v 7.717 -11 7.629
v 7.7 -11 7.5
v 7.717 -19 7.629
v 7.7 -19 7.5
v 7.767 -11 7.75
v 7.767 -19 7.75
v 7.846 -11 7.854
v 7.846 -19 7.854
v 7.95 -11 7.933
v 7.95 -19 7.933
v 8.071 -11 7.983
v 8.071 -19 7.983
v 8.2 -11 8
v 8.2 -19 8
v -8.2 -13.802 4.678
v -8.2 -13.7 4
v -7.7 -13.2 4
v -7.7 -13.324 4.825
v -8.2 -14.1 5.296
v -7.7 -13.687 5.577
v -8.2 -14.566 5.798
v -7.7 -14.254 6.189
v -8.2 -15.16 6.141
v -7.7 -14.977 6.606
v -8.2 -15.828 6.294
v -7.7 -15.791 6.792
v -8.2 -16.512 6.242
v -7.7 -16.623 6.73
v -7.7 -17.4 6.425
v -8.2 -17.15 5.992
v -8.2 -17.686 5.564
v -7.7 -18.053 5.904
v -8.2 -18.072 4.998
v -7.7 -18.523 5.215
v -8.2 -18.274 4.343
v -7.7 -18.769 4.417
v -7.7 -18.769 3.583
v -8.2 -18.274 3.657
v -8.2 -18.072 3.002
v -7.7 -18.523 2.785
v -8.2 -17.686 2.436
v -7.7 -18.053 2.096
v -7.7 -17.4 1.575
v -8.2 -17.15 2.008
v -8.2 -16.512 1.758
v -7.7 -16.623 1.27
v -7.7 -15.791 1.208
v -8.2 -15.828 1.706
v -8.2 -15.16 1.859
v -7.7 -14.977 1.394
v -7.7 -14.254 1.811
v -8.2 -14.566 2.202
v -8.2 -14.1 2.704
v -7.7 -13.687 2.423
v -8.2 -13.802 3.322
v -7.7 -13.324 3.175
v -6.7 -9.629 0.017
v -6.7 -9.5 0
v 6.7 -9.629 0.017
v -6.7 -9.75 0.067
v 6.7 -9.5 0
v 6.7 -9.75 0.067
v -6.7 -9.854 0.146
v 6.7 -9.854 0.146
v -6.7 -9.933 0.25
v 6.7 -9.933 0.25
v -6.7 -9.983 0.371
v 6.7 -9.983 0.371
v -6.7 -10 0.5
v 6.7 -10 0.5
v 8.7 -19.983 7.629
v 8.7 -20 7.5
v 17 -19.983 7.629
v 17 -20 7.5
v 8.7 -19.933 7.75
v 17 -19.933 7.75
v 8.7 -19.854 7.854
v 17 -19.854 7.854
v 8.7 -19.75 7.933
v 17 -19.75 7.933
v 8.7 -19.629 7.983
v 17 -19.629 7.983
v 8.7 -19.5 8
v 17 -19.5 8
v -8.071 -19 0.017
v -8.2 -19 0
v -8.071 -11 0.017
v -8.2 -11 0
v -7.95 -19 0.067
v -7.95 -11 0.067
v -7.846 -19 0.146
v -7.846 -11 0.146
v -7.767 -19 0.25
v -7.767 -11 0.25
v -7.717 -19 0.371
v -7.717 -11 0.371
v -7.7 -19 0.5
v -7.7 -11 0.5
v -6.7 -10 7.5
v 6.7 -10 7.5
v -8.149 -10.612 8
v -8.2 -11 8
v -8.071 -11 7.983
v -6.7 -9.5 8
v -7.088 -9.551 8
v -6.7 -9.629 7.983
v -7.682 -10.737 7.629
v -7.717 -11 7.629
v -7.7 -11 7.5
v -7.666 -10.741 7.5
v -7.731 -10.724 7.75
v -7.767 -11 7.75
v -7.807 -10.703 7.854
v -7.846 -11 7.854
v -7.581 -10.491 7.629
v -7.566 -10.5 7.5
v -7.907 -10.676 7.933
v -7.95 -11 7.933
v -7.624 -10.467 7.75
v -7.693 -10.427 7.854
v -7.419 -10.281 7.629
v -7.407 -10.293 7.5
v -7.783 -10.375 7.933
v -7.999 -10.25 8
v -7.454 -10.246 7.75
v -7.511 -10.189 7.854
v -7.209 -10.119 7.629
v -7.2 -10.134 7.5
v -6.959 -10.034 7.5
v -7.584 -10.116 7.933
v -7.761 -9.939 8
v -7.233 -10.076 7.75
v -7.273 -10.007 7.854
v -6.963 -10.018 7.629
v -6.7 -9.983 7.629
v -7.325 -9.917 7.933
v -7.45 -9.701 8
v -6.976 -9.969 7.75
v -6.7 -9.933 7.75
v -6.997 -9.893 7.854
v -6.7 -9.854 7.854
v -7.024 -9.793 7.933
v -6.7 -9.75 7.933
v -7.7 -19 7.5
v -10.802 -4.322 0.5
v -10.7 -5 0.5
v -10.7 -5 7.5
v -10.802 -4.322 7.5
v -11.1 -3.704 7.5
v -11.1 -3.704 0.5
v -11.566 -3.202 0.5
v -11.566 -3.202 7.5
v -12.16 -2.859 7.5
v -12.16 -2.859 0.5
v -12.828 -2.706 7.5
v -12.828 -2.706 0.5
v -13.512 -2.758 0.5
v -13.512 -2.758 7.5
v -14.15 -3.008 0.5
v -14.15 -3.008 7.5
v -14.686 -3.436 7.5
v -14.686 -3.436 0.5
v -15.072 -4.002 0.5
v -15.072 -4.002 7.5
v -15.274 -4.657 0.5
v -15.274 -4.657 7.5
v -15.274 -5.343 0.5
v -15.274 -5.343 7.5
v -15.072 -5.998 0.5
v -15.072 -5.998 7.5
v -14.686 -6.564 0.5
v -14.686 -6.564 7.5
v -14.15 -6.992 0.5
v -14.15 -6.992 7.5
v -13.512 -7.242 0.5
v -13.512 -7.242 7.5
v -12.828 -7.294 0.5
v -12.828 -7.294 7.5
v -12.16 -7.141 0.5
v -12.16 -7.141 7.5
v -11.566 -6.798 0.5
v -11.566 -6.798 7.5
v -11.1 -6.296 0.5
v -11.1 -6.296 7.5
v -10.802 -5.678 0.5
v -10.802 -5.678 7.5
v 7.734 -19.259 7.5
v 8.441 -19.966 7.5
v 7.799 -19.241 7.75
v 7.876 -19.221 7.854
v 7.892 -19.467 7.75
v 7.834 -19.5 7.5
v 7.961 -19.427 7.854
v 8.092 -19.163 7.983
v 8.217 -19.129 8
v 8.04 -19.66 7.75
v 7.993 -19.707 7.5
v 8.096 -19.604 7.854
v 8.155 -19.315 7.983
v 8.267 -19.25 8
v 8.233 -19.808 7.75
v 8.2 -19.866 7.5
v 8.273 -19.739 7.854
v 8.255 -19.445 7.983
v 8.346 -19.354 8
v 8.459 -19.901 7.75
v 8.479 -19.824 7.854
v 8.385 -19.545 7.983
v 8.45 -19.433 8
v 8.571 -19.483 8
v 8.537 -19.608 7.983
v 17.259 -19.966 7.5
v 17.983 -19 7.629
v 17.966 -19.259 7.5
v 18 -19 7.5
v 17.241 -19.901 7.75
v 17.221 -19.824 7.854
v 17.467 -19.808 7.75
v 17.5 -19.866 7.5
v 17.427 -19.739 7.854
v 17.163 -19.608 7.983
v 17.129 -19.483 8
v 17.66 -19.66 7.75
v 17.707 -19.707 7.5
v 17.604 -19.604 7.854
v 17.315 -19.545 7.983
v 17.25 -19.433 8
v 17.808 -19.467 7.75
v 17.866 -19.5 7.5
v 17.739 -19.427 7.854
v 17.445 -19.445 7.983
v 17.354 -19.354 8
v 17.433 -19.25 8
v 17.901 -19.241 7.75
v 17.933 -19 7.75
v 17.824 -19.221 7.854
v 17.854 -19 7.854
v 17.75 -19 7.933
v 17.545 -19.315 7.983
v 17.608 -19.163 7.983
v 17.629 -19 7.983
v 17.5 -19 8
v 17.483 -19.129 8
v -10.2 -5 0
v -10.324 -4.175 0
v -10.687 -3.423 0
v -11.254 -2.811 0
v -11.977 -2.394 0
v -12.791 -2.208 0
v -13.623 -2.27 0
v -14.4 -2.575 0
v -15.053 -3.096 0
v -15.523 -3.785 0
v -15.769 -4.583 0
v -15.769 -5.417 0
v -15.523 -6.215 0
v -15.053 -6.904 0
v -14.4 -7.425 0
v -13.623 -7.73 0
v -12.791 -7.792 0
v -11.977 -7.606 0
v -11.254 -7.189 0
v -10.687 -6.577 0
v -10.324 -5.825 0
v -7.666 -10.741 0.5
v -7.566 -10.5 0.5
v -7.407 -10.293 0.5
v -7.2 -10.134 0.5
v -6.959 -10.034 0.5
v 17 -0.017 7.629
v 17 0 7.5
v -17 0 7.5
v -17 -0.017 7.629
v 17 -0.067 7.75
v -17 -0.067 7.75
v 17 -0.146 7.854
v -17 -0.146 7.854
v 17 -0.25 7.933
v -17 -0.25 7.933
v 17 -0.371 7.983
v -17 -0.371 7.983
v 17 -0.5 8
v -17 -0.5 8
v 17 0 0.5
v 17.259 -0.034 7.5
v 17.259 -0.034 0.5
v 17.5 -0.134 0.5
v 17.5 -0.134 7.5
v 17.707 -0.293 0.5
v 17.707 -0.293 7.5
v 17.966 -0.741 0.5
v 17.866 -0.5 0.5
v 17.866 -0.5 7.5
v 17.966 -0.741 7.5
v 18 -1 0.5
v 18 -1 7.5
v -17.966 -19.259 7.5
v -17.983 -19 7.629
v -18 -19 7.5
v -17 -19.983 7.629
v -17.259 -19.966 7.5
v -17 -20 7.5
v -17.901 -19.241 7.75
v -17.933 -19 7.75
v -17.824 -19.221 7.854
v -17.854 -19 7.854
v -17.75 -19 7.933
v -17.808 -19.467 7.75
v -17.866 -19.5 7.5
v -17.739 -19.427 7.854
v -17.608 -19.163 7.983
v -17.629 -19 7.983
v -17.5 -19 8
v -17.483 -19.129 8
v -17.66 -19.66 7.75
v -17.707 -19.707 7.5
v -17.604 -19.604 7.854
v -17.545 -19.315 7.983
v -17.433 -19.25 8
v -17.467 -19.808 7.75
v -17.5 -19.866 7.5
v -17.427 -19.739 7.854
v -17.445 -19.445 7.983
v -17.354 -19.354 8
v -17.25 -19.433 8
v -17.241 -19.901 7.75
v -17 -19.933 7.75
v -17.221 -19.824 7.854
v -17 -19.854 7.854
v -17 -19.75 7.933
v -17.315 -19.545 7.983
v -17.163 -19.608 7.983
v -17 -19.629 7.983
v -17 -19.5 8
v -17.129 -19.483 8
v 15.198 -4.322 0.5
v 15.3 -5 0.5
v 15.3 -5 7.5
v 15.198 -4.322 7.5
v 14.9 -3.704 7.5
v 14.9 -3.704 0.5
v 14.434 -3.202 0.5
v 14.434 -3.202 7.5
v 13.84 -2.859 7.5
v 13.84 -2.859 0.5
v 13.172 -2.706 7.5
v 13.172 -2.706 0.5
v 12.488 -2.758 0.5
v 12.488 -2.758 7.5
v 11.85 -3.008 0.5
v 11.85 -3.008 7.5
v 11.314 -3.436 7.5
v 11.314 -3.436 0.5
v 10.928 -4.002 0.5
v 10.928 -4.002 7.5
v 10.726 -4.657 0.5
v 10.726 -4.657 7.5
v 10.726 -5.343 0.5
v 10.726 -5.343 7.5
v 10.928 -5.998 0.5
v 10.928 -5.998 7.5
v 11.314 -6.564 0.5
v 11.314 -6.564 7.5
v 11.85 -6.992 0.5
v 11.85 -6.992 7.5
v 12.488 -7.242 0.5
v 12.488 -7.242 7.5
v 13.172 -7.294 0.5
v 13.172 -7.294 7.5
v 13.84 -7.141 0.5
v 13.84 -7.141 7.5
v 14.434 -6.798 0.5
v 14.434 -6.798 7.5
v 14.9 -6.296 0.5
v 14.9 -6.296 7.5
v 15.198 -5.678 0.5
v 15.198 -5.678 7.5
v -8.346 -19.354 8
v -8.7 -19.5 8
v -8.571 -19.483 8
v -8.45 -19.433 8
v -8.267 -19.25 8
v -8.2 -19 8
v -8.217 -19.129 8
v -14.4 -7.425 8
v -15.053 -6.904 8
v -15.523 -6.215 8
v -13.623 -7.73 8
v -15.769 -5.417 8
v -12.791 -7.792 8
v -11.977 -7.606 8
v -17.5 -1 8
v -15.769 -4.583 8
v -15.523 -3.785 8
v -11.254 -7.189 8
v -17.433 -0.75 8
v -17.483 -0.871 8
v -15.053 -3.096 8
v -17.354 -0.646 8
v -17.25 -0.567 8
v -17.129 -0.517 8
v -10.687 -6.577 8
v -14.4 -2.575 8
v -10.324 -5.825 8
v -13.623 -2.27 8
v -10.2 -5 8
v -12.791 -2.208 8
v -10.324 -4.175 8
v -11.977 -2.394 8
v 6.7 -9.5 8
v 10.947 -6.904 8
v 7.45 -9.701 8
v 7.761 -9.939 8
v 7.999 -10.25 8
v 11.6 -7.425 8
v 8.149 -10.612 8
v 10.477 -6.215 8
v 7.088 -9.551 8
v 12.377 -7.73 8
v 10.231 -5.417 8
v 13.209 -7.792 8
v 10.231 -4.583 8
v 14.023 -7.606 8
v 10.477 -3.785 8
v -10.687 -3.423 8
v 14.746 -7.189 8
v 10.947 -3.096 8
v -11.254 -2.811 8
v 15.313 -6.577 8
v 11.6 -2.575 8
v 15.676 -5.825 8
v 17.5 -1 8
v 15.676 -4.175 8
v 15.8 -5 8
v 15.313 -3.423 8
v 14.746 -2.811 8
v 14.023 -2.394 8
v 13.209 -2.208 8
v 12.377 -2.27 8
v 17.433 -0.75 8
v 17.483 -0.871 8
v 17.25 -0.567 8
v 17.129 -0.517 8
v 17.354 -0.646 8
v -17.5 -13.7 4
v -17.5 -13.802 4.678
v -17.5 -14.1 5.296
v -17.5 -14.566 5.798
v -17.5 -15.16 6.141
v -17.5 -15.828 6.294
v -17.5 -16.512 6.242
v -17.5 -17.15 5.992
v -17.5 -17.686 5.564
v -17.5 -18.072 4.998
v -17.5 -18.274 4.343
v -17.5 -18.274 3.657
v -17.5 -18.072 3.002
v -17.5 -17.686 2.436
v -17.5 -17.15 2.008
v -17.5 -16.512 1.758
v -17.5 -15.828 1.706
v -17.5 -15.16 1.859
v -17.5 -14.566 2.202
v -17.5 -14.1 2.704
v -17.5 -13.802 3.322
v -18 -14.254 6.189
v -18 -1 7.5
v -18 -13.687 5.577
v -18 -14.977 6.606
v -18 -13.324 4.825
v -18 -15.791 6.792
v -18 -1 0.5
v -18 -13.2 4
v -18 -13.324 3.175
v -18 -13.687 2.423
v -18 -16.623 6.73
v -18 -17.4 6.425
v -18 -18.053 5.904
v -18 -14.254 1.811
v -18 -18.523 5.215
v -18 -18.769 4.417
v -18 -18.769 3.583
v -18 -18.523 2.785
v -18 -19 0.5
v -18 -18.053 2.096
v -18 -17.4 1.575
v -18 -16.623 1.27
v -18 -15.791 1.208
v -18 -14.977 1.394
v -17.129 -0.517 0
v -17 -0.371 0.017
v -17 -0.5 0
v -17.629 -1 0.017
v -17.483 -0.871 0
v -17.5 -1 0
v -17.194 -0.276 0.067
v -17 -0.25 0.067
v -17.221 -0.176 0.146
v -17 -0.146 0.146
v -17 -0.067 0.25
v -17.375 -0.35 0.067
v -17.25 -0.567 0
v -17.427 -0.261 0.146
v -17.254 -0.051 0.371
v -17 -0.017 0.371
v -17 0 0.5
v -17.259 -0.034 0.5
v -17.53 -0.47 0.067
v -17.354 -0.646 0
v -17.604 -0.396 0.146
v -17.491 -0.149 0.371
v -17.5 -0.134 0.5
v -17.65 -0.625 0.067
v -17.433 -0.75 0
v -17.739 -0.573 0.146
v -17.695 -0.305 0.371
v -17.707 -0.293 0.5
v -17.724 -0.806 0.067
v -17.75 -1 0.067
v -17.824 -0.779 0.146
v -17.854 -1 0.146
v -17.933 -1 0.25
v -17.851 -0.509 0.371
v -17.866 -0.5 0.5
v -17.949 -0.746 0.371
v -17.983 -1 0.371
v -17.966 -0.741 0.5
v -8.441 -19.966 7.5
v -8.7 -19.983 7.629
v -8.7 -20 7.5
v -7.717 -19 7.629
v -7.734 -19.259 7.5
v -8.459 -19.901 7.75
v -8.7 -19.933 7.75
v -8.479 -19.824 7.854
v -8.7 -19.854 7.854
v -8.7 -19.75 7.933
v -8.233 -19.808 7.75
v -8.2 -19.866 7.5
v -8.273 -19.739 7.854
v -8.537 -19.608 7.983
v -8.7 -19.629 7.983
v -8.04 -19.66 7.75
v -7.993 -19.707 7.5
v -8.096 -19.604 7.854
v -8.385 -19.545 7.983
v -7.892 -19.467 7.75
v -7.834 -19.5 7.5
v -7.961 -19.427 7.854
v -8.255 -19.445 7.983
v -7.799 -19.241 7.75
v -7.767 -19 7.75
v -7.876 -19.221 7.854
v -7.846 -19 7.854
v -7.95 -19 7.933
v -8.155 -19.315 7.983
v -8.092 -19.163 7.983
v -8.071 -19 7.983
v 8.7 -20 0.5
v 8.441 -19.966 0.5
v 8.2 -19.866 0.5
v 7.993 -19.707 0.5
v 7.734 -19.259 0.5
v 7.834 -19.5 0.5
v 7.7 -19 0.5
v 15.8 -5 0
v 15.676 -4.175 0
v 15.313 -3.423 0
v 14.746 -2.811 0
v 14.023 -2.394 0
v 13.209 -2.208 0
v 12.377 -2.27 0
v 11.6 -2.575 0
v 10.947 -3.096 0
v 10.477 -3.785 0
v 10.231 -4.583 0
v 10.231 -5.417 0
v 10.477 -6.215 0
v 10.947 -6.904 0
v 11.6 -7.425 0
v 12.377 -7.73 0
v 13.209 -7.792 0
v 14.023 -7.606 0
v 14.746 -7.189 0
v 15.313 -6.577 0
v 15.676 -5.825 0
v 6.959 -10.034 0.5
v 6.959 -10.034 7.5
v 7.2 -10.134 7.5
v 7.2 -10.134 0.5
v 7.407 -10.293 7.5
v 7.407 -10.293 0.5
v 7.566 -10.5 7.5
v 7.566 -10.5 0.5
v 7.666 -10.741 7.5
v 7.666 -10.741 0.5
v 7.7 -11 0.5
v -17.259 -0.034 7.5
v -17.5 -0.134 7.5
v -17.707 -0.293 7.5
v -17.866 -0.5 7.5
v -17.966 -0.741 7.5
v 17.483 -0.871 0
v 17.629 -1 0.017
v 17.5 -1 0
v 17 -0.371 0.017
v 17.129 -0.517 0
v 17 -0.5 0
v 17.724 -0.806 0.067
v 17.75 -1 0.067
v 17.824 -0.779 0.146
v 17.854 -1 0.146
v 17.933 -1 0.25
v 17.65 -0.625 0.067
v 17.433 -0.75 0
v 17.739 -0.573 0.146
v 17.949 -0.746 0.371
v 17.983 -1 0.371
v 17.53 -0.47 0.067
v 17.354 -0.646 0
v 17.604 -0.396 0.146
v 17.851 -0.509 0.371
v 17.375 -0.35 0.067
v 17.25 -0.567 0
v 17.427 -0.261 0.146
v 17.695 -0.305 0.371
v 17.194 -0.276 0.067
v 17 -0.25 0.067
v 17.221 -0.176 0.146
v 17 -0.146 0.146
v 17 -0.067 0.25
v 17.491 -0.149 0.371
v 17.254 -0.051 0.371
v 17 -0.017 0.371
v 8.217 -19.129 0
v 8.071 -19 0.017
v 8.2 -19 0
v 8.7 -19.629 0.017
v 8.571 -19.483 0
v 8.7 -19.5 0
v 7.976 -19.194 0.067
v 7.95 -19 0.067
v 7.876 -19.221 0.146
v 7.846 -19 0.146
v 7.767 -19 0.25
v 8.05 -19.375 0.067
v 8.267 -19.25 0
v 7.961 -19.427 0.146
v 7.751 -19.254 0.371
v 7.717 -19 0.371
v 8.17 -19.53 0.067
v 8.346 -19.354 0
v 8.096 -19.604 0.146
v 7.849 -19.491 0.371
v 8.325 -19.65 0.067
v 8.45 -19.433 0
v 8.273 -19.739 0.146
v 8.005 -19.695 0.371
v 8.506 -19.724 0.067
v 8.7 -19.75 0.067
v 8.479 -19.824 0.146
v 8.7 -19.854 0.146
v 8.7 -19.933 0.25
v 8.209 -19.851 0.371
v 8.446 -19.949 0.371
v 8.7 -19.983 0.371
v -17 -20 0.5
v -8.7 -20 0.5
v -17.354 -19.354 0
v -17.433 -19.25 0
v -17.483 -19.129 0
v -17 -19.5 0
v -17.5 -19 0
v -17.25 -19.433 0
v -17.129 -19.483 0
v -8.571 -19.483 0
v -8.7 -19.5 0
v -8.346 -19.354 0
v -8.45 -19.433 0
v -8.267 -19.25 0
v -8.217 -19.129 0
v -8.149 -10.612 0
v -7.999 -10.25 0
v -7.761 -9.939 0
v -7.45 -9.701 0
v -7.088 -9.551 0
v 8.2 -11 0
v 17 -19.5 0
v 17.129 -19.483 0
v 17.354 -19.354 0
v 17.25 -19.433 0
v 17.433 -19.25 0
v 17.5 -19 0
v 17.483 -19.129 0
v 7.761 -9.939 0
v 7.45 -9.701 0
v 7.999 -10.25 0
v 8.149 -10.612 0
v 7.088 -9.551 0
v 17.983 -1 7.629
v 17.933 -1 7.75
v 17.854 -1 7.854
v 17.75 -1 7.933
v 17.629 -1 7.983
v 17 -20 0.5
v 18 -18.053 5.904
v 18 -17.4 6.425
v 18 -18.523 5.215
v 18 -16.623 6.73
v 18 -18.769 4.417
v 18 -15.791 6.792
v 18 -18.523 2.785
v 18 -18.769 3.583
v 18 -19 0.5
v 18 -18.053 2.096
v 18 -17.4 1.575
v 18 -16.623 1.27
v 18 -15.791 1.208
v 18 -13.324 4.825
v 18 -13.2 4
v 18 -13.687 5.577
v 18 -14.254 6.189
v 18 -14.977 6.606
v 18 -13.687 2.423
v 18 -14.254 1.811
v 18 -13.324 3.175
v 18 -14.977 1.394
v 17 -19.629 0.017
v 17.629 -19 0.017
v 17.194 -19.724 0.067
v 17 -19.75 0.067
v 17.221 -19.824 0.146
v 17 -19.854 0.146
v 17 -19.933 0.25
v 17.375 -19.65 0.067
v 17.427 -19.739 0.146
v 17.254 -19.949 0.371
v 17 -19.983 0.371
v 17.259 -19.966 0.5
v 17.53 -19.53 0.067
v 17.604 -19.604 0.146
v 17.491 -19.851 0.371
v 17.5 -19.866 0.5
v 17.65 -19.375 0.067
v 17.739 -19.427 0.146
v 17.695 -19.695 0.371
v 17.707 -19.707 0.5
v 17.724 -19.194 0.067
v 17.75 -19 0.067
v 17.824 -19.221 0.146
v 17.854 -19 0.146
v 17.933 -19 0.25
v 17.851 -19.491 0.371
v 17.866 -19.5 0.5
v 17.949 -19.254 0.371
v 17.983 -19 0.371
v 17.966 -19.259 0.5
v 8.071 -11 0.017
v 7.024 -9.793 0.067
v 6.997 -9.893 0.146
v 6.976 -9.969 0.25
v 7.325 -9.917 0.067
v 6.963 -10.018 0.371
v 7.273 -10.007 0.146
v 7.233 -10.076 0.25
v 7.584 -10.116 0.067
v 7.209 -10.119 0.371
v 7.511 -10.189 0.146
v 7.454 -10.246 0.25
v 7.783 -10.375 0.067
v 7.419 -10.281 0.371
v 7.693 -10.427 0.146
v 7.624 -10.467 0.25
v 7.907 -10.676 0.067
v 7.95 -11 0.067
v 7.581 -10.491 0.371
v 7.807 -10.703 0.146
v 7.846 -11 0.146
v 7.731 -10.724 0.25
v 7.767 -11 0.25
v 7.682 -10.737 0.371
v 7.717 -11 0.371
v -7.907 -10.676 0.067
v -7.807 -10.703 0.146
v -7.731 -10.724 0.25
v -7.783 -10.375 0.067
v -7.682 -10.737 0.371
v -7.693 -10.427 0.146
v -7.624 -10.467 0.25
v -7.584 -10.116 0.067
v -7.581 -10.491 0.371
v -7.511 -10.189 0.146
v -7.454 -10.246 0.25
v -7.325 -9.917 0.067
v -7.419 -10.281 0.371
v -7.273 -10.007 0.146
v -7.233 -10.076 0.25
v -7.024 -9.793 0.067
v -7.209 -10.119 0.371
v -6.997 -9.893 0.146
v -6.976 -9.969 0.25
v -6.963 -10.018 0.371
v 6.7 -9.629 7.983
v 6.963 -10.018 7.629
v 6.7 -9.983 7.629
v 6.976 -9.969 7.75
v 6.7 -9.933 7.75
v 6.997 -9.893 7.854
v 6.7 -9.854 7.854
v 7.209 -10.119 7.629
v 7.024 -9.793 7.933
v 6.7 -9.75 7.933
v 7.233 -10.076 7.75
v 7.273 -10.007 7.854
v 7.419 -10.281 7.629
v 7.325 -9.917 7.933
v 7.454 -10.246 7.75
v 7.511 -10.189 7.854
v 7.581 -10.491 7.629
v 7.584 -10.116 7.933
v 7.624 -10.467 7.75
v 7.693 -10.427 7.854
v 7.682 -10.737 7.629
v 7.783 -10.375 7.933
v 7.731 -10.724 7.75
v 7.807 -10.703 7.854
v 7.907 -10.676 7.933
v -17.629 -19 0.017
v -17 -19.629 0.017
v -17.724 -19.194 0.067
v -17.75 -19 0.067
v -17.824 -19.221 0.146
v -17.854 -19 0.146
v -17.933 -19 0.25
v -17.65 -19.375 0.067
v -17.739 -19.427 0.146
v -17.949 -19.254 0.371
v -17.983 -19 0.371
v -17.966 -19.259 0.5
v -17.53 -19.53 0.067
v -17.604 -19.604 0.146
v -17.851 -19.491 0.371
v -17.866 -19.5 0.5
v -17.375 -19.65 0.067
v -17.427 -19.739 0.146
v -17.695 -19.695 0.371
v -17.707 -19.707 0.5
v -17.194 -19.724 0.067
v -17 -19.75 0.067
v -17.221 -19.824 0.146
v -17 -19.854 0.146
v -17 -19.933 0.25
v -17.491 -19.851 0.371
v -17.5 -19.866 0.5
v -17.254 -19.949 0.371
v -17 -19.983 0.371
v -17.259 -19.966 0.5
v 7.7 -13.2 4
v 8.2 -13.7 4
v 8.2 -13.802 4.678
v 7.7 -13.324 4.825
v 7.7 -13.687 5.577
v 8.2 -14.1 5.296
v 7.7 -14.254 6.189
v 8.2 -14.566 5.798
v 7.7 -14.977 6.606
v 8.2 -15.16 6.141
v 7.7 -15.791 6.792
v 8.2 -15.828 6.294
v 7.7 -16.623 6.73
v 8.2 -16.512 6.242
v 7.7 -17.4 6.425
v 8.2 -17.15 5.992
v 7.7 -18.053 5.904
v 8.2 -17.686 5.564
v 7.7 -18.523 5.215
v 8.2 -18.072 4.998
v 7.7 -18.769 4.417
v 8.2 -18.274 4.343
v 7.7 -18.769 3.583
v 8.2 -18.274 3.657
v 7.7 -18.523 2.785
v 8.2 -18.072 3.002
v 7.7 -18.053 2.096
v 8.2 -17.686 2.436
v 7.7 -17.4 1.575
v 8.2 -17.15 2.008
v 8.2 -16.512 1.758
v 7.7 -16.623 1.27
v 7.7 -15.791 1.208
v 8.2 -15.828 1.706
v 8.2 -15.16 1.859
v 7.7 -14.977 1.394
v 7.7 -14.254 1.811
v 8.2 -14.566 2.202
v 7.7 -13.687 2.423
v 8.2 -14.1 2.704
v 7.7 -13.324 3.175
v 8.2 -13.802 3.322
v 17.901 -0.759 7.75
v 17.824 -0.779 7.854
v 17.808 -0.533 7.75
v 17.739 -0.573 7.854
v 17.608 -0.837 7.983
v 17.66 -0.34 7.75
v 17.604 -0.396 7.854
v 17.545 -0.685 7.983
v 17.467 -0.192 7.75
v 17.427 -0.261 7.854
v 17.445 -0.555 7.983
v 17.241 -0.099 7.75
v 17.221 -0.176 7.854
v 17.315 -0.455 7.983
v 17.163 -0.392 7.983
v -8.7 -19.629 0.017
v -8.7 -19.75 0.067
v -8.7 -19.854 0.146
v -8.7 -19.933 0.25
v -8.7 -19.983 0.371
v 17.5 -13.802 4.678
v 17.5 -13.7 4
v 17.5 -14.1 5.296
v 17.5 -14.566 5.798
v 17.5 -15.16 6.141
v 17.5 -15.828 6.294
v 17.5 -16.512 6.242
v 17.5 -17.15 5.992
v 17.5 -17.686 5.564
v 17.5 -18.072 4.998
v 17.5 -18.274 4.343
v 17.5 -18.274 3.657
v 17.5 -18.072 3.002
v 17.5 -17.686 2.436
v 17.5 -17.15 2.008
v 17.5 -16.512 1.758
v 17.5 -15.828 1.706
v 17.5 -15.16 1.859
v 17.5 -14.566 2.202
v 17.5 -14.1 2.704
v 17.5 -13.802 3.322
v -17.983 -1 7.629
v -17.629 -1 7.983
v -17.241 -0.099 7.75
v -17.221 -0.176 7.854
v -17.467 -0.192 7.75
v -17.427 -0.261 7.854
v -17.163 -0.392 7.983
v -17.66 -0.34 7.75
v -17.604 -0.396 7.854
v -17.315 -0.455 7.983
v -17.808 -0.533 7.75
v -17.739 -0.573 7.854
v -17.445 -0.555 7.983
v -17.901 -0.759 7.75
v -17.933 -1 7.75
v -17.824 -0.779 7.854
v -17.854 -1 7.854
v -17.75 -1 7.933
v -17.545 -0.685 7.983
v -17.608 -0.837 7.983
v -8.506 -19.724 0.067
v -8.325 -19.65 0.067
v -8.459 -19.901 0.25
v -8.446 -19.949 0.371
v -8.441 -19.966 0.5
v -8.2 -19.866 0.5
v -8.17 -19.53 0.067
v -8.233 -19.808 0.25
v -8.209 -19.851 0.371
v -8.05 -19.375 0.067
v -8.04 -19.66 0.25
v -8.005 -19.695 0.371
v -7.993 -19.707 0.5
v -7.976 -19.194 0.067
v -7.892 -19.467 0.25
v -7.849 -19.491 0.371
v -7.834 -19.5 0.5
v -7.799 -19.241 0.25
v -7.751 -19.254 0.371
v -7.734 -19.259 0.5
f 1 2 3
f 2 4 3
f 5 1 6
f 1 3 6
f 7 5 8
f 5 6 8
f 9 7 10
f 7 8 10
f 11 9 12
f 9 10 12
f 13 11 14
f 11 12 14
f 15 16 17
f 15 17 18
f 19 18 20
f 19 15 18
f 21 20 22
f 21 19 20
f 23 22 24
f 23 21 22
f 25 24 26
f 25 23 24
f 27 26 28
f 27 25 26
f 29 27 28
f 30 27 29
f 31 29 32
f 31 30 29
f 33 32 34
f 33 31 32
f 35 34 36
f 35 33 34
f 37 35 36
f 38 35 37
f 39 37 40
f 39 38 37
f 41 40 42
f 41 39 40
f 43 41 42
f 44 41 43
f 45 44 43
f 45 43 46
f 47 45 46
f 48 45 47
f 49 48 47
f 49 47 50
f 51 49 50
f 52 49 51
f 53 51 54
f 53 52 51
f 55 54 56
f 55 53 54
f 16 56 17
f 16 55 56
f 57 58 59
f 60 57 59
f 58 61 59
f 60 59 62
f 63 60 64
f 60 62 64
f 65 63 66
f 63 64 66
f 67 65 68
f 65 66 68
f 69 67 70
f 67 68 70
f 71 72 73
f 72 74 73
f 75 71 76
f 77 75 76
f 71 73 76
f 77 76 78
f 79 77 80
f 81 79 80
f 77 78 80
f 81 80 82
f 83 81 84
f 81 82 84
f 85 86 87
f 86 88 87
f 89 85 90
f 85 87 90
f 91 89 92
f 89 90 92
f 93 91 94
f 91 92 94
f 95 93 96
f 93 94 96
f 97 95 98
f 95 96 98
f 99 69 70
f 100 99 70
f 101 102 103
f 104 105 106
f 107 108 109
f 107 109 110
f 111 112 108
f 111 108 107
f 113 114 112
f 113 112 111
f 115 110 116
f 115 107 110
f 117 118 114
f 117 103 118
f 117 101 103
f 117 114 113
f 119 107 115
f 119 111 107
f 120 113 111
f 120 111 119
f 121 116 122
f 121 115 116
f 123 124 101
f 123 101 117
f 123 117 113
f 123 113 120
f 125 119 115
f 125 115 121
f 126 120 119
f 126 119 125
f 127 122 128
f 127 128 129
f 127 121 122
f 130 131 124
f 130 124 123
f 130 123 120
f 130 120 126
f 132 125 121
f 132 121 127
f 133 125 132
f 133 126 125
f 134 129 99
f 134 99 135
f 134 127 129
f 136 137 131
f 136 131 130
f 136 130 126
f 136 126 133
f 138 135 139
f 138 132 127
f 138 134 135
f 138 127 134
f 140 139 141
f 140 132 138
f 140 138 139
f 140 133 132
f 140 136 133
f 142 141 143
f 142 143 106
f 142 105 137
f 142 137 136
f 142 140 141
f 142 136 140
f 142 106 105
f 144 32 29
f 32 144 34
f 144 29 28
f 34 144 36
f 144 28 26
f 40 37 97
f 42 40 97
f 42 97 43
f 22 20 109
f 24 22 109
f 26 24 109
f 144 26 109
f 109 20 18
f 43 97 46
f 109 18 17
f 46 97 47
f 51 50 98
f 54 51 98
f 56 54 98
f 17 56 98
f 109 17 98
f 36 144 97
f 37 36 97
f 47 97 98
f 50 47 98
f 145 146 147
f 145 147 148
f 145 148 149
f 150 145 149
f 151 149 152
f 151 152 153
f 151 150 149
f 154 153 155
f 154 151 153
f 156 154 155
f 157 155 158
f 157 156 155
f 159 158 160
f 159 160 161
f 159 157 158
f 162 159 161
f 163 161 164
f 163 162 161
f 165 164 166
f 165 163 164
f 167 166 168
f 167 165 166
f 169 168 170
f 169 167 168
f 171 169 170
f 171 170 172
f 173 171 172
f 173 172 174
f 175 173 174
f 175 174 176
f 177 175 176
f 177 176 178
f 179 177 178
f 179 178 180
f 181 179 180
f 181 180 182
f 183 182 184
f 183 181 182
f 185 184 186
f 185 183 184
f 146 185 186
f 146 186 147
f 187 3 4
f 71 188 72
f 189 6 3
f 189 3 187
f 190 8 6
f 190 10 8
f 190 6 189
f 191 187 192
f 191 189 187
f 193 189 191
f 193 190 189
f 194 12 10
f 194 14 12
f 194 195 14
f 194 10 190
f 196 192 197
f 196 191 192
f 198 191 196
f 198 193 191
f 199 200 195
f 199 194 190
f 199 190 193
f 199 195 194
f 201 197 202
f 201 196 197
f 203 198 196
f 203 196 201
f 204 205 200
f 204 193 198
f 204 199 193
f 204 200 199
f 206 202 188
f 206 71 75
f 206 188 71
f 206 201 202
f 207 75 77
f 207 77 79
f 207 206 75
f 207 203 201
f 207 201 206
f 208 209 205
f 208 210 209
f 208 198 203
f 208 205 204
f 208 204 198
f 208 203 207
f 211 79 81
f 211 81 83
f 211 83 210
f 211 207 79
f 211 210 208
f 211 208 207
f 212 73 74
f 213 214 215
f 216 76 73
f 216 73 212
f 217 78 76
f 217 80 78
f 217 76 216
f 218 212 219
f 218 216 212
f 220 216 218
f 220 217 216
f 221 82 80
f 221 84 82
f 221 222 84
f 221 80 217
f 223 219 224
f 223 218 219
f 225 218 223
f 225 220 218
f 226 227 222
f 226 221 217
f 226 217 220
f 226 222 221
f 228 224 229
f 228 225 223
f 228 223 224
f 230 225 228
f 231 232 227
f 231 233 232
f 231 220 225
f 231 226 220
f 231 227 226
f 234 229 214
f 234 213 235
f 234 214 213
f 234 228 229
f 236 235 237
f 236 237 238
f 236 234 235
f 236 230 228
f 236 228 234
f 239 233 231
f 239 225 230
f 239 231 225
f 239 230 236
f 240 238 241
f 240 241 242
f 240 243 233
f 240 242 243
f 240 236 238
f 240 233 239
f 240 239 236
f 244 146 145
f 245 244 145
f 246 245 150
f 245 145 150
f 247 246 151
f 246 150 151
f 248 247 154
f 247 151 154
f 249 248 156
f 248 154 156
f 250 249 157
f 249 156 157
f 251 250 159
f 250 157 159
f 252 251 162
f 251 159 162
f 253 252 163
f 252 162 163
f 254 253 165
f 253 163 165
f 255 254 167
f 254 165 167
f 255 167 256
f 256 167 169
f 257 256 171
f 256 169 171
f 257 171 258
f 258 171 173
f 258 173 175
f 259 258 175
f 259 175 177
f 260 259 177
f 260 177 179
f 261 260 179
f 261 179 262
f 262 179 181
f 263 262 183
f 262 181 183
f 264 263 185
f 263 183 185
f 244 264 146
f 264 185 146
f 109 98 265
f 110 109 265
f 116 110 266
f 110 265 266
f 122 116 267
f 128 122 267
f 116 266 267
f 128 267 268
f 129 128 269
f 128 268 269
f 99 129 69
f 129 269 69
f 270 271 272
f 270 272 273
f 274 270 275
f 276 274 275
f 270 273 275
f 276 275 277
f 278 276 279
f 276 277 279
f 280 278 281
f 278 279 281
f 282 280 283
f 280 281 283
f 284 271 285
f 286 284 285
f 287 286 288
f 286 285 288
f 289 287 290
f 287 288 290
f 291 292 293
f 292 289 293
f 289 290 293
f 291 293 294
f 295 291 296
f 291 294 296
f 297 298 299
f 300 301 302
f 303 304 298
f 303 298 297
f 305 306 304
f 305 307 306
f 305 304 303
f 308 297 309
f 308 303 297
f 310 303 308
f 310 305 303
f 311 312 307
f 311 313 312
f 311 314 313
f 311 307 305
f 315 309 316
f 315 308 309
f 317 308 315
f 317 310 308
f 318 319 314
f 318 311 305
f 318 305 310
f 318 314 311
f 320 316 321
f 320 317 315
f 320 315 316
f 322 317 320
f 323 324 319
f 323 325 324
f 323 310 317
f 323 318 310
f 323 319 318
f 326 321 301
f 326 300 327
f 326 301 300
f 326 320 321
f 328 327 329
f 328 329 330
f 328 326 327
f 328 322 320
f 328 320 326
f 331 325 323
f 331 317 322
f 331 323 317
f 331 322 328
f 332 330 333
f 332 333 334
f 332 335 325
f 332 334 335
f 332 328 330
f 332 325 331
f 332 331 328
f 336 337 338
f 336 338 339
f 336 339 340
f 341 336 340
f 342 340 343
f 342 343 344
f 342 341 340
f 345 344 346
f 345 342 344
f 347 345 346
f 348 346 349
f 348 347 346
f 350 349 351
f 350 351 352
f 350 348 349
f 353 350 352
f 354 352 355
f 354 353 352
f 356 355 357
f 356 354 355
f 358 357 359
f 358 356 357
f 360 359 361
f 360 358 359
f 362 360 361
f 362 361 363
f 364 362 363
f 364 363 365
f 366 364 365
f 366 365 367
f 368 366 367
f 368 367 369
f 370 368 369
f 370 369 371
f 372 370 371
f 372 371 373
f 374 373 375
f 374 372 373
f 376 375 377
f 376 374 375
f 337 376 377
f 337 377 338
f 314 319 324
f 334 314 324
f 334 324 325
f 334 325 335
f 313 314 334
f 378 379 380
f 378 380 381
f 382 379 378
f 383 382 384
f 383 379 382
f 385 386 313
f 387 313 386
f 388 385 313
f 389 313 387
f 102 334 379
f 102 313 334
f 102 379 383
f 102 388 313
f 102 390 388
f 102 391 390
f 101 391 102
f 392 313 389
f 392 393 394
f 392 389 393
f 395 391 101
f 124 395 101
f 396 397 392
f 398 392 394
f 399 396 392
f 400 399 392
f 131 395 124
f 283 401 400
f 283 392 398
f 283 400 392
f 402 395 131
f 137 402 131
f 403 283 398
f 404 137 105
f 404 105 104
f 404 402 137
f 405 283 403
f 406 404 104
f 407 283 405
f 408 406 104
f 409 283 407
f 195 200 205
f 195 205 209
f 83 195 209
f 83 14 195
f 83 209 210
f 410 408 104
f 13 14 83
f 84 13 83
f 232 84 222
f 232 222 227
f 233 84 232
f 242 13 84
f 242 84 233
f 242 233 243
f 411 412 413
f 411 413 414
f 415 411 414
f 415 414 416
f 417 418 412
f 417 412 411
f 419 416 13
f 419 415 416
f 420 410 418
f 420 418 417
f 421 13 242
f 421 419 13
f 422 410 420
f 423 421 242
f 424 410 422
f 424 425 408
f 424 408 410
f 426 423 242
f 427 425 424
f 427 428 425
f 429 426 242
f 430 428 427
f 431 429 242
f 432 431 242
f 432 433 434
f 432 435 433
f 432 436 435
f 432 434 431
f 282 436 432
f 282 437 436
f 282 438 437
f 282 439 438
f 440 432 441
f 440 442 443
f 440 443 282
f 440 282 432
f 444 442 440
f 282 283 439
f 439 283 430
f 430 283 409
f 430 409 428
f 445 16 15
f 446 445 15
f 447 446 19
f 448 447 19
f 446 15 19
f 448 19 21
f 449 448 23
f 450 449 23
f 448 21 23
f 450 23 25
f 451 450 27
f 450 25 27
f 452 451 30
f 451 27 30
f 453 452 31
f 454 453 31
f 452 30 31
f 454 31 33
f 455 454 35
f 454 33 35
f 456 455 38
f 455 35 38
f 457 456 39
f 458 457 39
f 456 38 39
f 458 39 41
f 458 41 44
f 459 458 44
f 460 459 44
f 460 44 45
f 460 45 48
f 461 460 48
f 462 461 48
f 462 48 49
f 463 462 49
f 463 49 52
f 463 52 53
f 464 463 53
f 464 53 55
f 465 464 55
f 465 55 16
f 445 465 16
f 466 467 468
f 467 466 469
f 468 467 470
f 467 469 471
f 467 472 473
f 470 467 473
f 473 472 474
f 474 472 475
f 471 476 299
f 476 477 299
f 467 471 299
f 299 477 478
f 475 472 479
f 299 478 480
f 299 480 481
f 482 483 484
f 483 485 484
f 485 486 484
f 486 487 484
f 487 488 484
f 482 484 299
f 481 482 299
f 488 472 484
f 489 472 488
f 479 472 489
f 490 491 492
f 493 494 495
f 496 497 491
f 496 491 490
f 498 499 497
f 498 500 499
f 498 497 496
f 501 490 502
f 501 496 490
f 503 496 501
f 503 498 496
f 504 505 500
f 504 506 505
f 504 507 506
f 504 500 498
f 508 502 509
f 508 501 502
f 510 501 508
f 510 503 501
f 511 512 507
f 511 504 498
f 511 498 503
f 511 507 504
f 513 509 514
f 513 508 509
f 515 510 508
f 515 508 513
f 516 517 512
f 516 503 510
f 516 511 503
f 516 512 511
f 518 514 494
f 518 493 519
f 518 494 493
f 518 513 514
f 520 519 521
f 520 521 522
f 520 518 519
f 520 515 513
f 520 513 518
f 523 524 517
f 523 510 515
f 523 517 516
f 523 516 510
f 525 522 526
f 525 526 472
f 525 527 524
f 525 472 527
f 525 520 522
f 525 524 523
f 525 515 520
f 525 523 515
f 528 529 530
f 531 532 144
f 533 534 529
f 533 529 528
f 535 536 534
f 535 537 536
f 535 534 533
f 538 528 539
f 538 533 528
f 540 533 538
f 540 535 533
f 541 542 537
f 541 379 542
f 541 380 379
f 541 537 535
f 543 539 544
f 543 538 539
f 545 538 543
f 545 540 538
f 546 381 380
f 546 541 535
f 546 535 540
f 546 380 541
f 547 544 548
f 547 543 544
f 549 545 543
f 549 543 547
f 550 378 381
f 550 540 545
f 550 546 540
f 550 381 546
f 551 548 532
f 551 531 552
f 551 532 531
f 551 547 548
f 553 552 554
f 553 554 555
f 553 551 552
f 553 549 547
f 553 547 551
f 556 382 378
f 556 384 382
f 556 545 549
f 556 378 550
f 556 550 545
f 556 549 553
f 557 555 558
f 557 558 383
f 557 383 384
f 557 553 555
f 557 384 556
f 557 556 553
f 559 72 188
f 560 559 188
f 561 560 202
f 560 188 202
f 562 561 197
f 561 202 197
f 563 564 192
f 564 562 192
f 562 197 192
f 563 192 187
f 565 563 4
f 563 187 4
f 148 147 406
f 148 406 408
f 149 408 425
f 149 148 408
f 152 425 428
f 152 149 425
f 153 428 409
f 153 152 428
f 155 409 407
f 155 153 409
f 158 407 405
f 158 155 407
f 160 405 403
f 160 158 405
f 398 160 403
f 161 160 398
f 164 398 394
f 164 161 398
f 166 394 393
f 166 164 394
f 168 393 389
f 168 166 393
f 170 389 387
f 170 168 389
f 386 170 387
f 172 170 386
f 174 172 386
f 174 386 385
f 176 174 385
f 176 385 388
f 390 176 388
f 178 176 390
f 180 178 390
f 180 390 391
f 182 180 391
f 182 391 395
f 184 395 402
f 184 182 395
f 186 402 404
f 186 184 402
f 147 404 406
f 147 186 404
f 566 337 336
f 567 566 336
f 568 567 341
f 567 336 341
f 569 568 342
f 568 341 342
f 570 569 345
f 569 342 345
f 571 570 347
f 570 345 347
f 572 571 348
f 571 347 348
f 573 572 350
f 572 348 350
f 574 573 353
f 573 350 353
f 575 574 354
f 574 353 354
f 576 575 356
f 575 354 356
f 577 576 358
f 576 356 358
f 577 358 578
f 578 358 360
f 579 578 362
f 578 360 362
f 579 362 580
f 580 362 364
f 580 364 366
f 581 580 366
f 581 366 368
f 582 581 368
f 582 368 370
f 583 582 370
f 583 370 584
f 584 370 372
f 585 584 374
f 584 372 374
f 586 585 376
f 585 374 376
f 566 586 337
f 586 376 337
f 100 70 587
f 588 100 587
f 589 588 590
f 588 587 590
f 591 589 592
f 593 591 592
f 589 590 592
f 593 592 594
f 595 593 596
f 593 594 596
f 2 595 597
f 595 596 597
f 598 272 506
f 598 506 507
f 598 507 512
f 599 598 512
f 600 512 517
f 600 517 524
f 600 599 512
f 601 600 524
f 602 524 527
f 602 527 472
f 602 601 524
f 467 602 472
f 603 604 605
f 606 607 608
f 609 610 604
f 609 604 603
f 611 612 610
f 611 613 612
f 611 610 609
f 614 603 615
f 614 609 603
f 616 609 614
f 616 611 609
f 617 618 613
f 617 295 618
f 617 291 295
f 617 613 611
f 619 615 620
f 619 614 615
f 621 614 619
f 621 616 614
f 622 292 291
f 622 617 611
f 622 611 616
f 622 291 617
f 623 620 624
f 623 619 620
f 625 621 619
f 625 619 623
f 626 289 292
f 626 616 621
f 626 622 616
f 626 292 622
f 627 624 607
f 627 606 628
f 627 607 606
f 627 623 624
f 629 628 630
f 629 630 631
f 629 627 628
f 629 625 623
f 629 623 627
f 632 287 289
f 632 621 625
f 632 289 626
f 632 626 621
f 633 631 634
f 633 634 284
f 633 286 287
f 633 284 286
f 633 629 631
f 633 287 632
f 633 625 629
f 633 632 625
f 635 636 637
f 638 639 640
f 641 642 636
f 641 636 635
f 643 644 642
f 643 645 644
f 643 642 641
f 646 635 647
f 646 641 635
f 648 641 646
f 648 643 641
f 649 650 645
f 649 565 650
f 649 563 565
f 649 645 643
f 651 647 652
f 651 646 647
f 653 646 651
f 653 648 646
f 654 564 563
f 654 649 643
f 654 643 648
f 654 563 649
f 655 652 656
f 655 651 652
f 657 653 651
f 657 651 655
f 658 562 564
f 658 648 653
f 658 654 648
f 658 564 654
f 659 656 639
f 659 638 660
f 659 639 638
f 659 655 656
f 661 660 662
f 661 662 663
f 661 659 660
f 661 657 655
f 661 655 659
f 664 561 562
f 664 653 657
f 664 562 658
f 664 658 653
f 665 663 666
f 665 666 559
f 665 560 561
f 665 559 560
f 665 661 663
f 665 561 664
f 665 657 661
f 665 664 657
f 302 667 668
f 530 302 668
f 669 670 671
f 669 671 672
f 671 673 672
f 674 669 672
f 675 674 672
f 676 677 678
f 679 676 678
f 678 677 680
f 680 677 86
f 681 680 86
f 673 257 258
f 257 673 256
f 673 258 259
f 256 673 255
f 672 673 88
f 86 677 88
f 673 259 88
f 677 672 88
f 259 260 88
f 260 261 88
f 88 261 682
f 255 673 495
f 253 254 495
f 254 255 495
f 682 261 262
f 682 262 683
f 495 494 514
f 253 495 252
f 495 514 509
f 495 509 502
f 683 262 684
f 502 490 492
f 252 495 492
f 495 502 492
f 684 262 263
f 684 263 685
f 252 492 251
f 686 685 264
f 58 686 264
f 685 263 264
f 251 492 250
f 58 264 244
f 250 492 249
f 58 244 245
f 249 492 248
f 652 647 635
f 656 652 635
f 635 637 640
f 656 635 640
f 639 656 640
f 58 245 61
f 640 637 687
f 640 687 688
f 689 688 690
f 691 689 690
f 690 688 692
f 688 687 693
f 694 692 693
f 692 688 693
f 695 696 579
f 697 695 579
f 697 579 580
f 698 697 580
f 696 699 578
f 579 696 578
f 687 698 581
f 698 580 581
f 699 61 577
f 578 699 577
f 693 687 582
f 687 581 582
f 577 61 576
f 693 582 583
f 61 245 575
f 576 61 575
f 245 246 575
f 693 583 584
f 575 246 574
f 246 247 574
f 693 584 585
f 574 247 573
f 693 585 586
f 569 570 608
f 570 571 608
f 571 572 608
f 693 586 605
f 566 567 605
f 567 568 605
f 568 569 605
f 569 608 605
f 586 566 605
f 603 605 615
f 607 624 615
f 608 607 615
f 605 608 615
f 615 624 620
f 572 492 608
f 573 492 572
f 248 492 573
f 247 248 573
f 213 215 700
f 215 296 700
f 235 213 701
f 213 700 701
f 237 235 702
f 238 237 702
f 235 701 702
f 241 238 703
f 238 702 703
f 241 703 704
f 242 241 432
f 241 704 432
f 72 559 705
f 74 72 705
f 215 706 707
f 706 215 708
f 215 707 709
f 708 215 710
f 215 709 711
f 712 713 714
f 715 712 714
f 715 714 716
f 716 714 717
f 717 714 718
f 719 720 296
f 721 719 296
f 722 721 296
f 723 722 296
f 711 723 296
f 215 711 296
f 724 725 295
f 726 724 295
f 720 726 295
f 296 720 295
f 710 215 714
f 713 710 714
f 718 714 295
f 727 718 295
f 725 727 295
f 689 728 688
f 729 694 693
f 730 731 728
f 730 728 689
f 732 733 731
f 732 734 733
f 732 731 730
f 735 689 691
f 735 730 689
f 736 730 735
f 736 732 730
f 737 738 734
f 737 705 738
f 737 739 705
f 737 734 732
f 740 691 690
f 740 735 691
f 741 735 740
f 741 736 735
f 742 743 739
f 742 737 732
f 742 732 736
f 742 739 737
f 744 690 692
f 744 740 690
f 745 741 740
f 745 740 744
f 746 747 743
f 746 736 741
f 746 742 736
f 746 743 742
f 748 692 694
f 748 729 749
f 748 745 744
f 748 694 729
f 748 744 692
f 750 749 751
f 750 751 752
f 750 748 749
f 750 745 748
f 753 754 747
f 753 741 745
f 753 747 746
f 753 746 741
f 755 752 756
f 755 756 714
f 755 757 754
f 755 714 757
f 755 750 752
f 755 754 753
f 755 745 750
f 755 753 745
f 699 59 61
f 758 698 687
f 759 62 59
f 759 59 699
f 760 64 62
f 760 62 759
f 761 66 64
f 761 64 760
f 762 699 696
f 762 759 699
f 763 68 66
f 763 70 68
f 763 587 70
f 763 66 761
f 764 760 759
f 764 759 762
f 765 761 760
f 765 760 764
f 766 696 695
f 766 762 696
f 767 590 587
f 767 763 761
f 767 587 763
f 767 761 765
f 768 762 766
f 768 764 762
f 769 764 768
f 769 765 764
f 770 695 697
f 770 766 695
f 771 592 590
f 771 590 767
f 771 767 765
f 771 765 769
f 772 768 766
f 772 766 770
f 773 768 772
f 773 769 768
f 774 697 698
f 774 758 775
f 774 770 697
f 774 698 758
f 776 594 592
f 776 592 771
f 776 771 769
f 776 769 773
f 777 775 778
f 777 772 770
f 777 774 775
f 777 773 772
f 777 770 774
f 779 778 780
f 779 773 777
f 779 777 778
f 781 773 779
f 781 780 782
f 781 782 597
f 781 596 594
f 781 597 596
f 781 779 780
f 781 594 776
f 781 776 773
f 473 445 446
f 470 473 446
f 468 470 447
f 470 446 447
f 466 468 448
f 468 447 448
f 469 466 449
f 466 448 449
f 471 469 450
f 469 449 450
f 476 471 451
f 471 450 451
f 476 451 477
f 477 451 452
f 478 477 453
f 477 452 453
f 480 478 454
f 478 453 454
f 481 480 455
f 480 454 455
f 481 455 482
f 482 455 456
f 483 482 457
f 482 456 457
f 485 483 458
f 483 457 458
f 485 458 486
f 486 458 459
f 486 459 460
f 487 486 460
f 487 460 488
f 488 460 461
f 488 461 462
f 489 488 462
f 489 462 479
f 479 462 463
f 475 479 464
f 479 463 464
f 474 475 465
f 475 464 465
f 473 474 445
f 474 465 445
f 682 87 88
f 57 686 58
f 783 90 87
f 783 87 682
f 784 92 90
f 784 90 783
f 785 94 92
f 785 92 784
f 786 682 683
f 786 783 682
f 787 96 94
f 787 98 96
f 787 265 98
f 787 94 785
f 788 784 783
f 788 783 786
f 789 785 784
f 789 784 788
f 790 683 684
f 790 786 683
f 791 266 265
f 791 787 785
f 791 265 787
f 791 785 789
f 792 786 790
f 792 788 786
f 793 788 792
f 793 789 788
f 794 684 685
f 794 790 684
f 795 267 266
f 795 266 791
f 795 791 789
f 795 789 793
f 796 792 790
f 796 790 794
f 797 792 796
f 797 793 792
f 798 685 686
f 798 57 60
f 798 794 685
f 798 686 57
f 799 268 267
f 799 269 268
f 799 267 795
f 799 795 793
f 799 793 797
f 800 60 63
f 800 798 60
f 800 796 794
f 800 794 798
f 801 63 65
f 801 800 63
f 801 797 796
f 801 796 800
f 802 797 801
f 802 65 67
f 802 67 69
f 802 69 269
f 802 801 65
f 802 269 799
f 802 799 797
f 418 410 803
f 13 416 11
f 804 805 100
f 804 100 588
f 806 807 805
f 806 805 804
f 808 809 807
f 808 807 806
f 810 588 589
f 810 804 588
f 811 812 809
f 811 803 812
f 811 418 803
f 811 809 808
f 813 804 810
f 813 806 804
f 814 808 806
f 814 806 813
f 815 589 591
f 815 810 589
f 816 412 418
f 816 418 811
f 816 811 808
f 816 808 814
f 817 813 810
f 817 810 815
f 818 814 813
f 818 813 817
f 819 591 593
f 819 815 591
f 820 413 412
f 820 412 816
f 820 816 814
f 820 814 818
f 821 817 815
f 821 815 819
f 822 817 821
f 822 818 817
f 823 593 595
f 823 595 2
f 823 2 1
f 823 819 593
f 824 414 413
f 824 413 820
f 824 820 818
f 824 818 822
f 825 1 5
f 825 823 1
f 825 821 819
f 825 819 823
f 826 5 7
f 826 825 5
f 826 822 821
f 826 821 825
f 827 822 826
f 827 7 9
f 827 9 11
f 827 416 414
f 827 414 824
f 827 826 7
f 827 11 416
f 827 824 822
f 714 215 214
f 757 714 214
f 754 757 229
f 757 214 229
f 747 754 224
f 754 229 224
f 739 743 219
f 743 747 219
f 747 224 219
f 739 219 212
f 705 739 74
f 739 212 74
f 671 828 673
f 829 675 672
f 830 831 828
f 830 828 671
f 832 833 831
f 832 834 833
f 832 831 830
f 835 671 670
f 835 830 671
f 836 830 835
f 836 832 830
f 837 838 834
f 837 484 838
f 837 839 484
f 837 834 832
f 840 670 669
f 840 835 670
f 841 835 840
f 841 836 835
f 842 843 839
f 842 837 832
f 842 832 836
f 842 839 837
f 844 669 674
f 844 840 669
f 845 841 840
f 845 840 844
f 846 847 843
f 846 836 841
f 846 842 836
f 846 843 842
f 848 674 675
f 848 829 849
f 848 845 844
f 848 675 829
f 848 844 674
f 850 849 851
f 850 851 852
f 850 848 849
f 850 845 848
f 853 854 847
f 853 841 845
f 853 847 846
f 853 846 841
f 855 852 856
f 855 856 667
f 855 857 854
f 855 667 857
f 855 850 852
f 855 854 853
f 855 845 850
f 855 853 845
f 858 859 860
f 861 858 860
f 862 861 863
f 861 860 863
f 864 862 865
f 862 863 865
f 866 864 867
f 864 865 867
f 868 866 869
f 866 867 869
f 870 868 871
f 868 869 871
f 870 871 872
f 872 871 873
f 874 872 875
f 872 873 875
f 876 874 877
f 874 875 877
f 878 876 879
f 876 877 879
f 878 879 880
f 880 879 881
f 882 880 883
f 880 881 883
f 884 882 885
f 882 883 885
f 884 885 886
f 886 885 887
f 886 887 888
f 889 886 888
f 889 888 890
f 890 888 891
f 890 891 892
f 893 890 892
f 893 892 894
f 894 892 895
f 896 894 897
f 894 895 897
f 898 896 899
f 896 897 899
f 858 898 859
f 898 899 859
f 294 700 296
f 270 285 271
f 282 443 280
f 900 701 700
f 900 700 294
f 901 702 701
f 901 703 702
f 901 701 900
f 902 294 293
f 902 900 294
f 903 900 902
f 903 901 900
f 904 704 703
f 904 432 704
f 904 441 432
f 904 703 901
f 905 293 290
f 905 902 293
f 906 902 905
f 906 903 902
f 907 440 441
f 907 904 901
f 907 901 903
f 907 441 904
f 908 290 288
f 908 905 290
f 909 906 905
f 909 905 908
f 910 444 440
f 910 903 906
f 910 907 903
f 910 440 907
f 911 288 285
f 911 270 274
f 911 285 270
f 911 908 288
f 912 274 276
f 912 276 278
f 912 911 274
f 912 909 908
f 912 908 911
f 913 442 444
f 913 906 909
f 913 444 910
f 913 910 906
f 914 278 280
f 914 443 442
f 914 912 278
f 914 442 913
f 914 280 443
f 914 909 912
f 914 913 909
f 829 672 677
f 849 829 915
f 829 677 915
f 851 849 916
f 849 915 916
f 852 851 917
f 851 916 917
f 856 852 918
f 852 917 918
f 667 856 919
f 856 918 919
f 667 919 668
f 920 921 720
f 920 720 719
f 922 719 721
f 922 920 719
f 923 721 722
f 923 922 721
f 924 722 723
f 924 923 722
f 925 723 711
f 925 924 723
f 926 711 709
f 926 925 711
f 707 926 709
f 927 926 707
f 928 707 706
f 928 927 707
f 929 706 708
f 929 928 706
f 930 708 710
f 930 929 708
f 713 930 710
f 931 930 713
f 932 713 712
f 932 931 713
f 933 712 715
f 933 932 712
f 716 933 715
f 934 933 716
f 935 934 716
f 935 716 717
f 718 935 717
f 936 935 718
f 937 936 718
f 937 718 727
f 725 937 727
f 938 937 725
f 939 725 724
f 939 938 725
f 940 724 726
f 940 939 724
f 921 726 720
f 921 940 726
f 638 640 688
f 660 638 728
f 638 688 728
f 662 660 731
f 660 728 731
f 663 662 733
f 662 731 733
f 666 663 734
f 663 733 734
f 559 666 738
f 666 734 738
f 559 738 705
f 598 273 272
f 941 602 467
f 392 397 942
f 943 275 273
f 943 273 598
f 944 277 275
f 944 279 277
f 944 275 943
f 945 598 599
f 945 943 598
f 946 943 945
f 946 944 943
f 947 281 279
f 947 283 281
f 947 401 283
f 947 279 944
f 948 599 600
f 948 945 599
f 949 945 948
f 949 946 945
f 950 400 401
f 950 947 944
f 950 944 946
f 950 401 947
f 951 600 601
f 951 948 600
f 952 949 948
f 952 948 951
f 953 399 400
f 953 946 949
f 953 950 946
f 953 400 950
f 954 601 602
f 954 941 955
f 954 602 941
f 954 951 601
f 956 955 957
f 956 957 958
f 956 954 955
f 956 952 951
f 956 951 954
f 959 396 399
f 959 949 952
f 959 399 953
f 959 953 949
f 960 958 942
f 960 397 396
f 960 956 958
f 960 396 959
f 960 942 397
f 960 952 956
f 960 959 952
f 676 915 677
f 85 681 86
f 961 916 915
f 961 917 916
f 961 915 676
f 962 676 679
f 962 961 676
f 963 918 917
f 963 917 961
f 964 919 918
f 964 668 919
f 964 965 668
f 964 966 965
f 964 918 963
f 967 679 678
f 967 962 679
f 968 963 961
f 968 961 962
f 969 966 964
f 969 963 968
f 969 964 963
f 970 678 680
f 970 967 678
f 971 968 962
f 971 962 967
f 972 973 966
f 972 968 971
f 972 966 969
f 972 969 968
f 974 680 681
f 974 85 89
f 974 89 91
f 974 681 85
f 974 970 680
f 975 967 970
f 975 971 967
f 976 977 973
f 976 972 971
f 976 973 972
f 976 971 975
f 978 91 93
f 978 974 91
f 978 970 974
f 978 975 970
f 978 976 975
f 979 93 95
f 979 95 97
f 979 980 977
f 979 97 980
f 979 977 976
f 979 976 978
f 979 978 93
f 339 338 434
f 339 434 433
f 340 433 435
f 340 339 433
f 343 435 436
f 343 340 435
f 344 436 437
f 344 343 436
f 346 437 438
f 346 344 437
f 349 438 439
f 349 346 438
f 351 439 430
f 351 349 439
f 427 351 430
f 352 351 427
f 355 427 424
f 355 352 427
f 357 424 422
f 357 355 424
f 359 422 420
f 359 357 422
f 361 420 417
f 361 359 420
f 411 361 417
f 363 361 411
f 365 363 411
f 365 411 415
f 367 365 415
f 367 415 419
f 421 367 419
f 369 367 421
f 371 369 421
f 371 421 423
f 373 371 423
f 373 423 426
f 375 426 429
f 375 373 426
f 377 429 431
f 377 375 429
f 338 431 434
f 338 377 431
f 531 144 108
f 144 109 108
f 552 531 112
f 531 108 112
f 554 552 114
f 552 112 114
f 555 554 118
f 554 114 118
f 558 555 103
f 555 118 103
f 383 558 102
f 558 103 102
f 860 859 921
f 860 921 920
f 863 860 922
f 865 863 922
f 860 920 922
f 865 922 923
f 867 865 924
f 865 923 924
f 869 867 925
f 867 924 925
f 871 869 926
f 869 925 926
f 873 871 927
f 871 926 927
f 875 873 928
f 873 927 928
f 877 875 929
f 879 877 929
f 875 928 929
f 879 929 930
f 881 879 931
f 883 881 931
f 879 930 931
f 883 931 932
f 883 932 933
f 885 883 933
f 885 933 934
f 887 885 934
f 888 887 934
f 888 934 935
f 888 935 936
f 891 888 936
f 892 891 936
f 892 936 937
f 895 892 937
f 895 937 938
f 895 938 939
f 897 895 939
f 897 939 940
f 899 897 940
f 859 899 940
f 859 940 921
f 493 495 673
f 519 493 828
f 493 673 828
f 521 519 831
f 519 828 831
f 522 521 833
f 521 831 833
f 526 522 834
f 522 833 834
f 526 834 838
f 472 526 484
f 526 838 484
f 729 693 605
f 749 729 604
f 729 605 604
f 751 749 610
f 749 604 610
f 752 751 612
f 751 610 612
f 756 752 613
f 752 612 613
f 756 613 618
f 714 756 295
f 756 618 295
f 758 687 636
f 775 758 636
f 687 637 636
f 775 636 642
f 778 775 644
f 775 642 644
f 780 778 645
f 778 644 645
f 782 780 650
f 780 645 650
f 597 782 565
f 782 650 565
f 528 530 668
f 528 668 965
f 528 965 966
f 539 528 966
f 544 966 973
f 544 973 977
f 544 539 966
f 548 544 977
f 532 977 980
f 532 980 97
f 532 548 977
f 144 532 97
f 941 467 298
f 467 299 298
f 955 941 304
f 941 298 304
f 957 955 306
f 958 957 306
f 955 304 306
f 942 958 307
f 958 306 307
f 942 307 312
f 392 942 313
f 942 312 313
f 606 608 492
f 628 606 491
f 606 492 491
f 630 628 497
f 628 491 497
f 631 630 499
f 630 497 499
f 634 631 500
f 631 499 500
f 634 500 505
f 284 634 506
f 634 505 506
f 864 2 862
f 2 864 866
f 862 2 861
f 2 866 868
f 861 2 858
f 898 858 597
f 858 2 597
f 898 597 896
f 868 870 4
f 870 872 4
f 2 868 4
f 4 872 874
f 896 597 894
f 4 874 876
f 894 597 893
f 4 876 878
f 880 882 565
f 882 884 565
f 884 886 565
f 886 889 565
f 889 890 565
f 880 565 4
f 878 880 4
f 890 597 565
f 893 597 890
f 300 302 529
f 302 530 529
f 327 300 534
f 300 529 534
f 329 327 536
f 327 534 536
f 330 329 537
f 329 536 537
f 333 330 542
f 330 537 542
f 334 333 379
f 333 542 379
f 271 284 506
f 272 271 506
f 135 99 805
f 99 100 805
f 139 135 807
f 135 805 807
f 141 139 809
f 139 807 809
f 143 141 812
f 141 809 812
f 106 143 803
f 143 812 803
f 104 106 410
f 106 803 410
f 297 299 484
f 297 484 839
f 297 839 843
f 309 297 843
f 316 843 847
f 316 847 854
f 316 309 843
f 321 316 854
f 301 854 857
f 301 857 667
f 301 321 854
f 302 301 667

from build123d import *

# Parameters (mm, degrees)
F0_R     = 2.3
F1_DEPTH = 8
F2_R     = 2.3
F3_DEPTH = 36.001
F4_R     = 1
F5_SIZE  = 0.5
F6_R     = 0.5


with BuildPart() as f1:
    # F0 (on Top) → F1 (new body)
    with BuildSketch(Plane.XY):
        with BuildLine():
            Line((18, 0), (0, 0))
            Line((0, 0), (-18, 0))
            Line((-18, 0), (-18, -20))
            Line((-18, -20), (-7.7, -20))
            Line((-7.7, -20), (-7.7, -11))
            ThreePointArc((-7.7, -11), (-7.4071067812, -10.2928932188), (-6.7, -10))
            Line((-6.7, -10), (0, -10))
            Line((0, -10), (6.7, -10))
            ThreePointArc((6.7, -10), (7.4071067812, -10.2928932188), (7.7, -11))
            Line((7.7, -11), (7.7, -20))
            Line((7.7, -20), (18, -20))
            Line((18, -20), (18, 0))
        make_face()
        with Locations((-13, -5)):
            Circle(F0_R, mode=Mode.SUBTRACT)
        with Locations((13, -5)):
            Circle(F0_R, mode=Mode.SUBTRACT)
    extrude(amount=F1_DEPTH)

    # F2 (on face) → F3 (cut, through all)
    with BuildSketch(Plane.YZ.offset(18)):
        with Locations((-16, 4)):
            Circle(F2_R)
    extrude(amount=-F3_DEPTH, mode=Mode.SUBTRACT)

    # F4
    f4_edges = [f1.edges().sort_by_distance(p)[0] for p in [
        (-18, -20, 4),
        (7.7, -20, 4),
        (18, -20, 4),
        (-18, 0, 4),
        (18, 0, 4),
        (-7.7, -20, 4),
    ]]
    fillet(f4_edges, radius=F4_R)

    # F5
    f5_edges = [f1.edges().sort_by_distance(p)[0] for p in [
        (-15.3, -5, 8),
        (10.7, -5, 8),
        (-15.3, -5, 0),
        (10.7, -5, 0),
        (-7.7, -18.3, 4),
        (-18, -18.3, 4),
        (7.7, -18.3, 4),
        (18, -18.3, 4),
    ]]
    chamfer(f5_edges, length=F5_SIZE)

    # F6
    f6_edges = [f1.edges().sort_by_distance(p)[0] for p in [
        (-12.85, -20, 8),
        (-7.992893, -19.707107, 8),
        (-7.7, -15, 8),
        (-7.407107, -10.292893, 8),
        (0, -10, 8),
        (7.407107, -10.292893, 8),
        (7.7, -15, 8),
        (7.992893, -19.707107, 8),
        (12.85, -20, 8),
        (17.707107, -19.707107, 8),
        (18, -10, 8),
        (17.707107, -0.292893, 8),
        (0, 0, 8),
        (-17.707107, -0.292893, 8),
        (-18, -10, 8),
        (-17.707107, -19.707107, 8),
        (-7.7, -15, 0),
    ]]
    fillet(f6_edges, radius=F6_R)


solid = f1.part
